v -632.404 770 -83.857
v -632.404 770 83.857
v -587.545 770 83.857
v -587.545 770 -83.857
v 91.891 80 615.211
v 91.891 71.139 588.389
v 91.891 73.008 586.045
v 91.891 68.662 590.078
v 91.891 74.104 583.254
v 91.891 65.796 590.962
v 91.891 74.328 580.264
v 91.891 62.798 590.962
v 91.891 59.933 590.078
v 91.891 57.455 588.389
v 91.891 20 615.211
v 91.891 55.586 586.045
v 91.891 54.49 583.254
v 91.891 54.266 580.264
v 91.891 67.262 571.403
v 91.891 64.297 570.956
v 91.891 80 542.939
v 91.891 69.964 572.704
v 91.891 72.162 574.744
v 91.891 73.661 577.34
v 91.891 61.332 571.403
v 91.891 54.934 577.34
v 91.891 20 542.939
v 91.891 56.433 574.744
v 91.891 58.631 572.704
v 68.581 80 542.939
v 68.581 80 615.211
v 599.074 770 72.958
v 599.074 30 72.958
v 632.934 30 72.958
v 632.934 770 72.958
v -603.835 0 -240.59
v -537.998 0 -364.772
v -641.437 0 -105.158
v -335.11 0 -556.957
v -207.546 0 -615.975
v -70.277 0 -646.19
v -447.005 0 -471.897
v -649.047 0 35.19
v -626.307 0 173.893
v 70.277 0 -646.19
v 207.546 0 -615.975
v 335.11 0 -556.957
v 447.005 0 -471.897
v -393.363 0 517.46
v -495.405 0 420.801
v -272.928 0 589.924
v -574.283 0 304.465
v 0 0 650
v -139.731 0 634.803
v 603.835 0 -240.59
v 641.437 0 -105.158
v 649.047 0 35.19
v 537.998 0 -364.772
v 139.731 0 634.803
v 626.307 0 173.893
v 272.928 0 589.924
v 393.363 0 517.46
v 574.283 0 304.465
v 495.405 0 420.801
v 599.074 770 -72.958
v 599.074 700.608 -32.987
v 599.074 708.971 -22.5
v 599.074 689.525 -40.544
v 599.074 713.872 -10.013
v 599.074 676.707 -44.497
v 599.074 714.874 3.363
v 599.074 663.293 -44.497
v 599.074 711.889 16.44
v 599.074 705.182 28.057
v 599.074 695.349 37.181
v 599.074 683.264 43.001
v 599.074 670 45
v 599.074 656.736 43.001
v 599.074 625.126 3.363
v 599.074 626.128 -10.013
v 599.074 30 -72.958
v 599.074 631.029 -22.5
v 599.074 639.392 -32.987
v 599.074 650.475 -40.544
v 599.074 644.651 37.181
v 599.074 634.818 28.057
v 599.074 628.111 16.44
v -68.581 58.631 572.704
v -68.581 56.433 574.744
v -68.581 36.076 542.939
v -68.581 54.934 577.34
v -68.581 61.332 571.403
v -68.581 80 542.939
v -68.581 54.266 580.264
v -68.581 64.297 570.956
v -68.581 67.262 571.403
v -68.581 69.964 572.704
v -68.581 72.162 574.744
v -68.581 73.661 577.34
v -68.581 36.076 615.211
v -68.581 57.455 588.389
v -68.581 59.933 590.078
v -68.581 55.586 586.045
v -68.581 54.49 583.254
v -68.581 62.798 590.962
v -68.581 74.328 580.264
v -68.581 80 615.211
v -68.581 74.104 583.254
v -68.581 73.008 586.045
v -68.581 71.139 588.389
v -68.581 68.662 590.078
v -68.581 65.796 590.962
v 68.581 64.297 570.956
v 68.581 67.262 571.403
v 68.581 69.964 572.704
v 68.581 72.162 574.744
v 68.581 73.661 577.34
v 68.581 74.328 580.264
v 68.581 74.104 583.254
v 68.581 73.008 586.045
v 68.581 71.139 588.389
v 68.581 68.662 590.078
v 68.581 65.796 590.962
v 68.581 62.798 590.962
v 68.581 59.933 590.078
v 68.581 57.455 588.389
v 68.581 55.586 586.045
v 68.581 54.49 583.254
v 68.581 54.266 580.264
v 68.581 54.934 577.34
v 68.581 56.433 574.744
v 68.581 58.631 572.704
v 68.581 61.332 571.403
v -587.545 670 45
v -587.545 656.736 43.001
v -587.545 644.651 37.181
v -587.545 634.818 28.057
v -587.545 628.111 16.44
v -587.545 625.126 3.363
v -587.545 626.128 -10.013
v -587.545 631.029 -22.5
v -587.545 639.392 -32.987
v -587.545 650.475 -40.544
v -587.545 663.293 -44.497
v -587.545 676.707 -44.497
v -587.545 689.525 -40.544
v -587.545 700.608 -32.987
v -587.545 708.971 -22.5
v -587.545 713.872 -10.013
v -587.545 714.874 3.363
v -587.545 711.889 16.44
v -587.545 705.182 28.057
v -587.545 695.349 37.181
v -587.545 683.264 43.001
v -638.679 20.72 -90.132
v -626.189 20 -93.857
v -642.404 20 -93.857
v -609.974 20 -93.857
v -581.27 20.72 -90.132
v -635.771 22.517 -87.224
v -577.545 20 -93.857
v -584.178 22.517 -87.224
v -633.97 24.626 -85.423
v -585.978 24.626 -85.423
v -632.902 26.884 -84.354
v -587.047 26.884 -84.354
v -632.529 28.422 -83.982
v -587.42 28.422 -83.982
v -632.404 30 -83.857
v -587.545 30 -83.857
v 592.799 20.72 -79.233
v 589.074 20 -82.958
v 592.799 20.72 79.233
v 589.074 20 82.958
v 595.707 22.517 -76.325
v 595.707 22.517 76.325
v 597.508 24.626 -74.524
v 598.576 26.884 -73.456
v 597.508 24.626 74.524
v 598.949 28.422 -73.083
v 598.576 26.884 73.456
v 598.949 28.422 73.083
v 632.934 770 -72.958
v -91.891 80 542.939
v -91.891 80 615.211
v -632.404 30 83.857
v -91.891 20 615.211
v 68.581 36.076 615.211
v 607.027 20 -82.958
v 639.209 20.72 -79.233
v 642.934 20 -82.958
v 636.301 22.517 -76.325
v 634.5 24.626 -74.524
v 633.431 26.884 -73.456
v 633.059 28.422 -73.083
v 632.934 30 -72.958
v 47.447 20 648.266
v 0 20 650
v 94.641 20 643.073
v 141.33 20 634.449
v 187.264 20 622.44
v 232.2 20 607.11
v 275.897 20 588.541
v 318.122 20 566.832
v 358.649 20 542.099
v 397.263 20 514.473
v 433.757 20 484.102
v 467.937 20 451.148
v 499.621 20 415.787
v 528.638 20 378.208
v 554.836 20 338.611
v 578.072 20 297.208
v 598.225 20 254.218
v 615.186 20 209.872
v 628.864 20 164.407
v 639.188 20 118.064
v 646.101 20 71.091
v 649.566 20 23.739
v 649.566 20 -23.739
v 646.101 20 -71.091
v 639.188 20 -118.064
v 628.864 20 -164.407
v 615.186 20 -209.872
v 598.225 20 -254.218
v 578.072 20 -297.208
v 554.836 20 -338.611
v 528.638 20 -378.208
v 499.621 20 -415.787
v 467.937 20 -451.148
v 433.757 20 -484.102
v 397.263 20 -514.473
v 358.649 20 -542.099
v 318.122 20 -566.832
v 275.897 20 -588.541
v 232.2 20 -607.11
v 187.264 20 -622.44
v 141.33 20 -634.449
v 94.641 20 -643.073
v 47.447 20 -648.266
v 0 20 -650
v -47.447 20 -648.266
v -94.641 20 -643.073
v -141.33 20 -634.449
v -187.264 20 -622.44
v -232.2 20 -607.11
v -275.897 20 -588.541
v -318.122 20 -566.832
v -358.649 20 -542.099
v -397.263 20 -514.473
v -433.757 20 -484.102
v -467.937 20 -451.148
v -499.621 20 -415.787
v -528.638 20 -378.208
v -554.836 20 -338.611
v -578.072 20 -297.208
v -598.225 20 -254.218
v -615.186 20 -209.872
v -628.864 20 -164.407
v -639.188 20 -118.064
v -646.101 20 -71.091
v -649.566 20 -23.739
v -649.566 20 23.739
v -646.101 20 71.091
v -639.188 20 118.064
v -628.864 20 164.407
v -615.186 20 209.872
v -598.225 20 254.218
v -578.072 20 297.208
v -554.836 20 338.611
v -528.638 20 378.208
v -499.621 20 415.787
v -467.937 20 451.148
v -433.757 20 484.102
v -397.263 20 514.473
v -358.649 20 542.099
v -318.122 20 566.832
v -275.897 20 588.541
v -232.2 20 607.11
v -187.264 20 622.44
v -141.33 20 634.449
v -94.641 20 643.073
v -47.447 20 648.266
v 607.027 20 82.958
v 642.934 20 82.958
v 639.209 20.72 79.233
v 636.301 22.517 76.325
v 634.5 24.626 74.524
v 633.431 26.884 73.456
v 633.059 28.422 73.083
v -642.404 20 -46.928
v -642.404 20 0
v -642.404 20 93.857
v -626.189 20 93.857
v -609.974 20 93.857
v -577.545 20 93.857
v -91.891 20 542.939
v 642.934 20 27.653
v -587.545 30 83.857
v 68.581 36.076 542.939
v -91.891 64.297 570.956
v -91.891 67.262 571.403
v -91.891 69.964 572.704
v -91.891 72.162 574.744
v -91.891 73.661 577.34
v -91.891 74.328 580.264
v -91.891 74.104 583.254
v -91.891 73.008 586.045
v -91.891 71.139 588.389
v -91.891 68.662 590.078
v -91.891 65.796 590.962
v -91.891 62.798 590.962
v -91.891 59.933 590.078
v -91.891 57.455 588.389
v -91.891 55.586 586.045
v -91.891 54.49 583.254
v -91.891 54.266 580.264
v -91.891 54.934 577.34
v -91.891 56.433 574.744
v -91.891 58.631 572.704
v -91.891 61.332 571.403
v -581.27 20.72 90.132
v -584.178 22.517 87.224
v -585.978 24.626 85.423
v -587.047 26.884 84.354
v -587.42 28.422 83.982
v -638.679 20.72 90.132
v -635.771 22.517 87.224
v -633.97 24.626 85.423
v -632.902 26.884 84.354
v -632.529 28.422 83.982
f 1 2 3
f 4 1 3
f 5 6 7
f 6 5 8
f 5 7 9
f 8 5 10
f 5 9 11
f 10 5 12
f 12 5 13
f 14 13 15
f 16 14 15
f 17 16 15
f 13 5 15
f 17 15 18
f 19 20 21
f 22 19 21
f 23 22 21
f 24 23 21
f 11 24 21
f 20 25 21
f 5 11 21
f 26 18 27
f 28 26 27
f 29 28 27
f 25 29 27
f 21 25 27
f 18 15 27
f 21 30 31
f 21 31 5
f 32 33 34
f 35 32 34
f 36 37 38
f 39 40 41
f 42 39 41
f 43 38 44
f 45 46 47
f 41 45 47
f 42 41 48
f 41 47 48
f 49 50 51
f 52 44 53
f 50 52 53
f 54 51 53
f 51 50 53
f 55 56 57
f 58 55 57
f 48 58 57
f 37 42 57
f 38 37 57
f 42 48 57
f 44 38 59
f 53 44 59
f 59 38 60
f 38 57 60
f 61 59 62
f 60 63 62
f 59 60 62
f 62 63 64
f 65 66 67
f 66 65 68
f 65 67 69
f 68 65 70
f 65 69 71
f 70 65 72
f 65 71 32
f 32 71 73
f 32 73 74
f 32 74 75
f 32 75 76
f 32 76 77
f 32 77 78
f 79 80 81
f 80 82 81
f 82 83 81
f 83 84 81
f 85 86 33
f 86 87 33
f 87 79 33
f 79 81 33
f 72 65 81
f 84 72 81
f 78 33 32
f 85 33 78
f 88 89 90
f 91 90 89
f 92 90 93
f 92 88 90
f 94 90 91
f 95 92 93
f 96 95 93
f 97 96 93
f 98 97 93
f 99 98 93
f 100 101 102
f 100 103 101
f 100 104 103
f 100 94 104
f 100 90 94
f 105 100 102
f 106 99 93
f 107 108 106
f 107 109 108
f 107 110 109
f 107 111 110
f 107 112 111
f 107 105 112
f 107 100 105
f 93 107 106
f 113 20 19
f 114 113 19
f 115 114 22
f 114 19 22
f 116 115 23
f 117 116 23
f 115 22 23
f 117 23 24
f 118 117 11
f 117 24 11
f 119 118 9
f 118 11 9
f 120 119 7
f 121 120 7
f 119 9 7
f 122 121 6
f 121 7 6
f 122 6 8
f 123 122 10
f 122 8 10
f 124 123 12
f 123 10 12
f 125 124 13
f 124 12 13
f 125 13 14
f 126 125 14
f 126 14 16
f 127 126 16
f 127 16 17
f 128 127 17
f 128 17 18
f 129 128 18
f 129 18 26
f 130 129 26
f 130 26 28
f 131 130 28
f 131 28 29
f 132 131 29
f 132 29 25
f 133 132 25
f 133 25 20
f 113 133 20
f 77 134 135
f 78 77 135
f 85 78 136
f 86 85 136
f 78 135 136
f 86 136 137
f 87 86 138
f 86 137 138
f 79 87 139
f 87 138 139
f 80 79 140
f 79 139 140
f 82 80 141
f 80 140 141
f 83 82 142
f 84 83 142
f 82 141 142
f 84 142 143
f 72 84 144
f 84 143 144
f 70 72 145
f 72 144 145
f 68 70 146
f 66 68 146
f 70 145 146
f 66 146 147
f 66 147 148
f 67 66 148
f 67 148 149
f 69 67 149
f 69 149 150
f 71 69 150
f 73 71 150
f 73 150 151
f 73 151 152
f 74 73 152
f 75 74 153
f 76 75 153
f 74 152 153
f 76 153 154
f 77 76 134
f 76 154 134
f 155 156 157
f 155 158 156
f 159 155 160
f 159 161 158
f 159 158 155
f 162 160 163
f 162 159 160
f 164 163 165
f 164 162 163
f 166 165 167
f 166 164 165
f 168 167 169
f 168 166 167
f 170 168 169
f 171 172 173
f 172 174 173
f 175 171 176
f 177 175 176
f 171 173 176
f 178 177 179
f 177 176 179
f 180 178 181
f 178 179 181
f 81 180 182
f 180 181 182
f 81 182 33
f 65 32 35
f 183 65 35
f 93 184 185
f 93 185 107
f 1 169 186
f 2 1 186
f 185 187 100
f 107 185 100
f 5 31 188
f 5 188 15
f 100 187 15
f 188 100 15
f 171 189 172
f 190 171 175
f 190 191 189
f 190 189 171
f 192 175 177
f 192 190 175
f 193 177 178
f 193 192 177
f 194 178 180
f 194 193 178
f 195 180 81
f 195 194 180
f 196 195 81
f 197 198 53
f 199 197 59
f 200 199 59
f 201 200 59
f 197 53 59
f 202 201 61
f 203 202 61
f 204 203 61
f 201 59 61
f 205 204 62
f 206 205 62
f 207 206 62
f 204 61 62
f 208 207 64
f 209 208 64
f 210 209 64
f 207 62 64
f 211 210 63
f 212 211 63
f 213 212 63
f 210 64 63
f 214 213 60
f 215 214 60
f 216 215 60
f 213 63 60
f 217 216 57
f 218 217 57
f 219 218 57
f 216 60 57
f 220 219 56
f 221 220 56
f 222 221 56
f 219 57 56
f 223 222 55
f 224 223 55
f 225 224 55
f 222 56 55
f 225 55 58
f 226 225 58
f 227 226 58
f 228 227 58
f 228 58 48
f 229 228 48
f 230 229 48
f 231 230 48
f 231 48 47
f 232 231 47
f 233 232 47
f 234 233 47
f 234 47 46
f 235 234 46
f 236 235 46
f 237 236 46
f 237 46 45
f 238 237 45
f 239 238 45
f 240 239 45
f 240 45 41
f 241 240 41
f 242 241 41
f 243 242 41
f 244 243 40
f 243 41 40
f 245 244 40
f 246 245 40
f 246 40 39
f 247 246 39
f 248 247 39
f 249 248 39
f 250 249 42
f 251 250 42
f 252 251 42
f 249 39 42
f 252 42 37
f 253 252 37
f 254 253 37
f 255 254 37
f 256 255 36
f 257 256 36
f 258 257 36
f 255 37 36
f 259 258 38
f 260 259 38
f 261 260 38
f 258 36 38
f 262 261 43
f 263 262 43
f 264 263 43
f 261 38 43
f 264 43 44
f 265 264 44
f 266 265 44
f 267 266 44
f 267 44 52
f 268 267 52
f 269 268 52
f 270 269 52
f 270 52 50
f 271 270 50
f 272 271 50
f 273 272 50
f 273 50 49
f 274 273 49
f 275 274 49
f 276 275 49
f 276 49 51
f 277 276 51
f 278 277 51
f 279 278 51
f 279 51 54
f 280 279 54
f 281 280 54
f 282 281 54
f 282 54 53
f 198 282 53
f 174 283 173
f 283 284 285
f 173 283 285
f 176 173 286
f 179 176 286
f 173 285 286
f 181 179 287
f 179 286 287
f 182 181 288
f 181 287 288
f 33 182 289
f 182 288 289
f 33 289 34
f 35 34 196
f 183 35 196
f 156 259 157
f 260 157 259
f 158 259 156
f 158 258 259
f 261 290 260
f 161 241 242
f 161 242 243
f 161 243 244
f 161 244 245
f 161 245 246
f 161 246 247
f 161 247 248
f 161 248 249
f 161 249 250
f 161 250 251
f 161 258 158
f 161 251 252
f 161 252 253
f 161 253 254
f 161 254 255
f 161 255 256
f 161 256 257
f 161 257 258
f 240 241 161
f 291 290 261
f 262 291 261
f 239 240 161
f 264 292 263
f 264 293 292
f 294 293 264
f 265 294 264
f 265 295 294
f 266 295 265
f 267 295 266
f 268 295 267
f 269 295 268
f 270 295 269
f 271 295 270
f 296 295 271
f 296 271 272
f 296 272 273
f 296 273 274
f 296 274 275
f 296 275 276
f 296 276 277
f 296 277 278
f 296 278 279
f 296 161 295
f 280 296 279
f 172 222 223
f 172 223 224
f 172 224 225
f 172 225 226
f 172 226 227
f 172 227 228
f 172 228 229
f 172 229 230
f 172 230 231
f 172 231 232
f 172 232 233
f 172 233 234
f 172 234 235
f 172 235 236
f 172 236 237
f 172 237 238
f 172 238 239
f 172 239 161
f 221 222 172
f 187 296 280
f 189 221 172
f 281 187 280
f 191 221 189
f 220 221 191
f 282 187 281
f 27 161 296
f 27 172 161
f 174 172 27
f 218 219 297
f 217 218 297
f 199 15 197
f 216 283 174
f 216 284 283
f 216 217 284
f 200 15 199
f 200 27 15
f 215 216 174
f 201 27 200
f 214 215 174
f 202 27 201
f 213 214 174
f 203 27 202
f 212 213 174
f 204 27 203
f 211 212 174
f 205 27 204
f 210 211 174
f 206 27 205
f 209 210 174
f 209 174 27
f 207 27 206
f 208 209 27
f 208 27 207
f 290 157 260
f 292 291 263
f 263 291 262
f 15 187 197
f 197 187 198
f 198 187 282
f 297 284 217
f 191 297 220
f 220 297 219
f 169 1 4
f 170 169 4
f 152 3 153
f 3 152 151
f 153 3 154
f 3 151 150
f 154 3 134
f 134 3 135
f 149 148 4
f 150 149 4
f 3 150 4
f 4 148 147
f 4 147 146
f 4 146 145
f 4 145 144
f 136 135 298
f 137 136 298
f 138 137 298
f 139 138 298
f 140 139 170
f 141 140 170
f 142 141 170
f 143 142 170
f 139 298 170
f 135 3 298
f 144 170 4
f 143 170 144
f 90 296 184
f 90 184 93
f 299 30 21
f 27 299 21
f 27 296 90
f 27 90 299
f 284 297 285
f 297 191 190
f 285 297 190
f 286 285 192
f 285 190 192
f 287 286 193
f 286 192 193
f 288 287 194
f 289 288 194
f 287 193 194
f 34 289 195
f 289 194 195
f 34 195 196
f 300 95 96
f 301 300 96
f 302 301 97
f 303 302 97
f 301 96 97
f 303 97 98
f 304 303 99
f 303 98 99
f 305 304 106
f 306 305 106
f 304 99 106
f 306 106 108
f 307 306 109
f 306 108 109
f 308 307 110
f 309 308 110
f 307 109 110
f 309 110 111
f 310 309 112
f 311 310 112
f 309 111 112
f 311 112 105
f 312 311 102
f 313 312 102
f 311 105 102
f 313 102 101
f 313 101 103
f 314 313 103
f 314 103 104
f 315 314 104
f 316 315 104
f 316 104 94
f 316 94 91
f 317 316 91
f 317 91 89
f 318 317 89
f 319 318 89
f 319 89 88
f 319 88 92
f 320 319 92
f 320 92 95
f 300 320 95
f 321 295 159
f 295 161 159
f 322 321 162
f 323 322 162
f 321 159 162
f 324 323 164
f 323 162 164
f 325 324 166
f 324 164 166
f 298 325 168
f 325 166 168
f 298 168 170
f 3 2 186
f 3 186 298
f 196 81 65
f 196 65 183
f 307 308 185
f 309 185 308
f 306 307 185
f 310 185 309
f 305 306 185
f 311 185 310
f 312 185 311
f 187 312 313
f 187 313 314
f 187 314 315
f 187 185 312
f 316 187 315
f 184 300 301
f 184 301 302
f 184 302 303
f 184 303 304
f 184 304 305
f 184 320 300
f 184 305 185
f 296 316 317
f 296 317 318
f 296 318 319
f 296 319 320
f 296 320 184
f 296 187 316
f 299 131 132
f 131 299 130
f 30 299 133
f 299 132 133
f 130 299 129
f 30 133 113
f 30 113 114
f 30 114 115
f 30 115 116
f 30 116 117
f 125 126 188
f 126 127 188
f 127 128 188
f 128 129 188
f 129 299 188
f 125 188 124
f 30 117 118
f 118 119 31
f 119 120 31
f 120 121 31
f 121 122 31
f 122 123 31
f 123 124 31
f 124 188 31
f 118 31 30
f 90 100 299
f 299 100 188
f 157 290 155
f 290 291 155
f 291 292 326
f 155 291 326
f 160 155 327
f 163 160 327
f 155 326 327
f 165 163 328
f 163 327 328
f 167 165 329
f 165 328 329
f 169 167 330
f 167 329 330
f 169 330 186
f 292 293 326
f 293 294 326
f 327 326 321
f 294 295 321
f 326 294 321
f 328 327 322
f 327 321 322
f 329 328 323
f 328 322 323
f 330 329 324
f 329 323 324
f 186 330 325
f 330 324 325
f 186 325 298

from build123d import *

# Parameters (mm, degrees)
SKETCH1_R           = 650
BOSS_EXTRUDE1_DEPTH = 20
SKETCH2_W           = 33.859391453
SKETCH2_H           = 72.958055336
SKETCH2_W_2         = 44.858886192
SKETCH2_H_2         = 83.856653026
BOSS_EXTRUDE2_DEPTH = 750
SKETCH3_R           = 45
BOSS_EXTRUDE3_DEPTH = 1186.61916287
FILLET1_R           = 10
SKETCH4_W           = 183.78137906
SKETCH4_H           = 72.271116226
BOSS_EXTRUDE4_DEPTH = 60
SKETCH5_W           = 137.162690518
SKETCH5_H           = 87.847771894
CUT_EXTRUDE1_DEPTH  = 139
SKETCH6_R           = 10.058928829
CUT_EXTRUDE2_DEPTH  = 200


with BuildPart() as part:
    # Sketch1 → Boss-Extrude1 (new body)
    with BuildSketch(Plane(origin=(0, 0, 0), x_dir=(1, 0, 0), z_dir=(0, 1, 0))):
        with Locations(Location((0, 0, 0), (0, 0, 270))):
            Circle(SKETCH1_R)
    extrude(amount=BOSS_EXTRUDE1_DEPTH)

    # Sketch2 → Boss-Extrude2 (add)
    with BuildSketch(Plane(origin=(0, 20, 0), x_dir=(1, 0, 0), z_dir=(0, 1, 0))):
        with Locations((616.00396434, -36.479027668)):
            Rectangle(SKETCH2_W, SKETCH2_H)
        with Locations((616.00396434, 36.479027668)):
            Rectangle(SKETCH2_W, SKETCH2_H)
        with Locations((-609.974337352, -41.928326513)):
            Rectangle(SKETCH2_W_2, SKETCH2_H_2)
        with Locations((-609.974337352, 41.928326513)):
            Rectangle(SKETCH2_W_2, SKETCH2_H_2)
    extrude(amount=BOSS_EXTRUDE2_DEPTH)

    # Sketch3 → Boss-Extrude3 (add)
    with BuildSketch(Plane(origin=(-587.544894256, 0, 0), x_dir=(0, 0, -1), z_dir=(1, 0, 0))):
        with Locations(Location((0, 670, 0), (0, 0, 180))):
            Circle(SKETCH3_R)
    extrude(amount=BOSS_EXTRUDE3_DEPTH)

    # Fillet1
    fillet1_edges = [part.edges().sort_by_distance(p)[0] for p in [
        (616.00396434, 20, -72.958055336),
        (-609.974337352, 20, 83.856653026),
        (-587.544894256, 20, 0),
        (-632.403780448, 20, 0),
        (-609.974337352, 20, -83.856653026),
        (616.00396434, 20, 72.958055336),
        (632.933660066, 20, 0),
        (599.074268613, 20, 0),
    ]]
    fillet(fillet1_edges, radius=FILLET1_R)

    # Sketch4 → Boss-Extrude4 (add)
    with BuildSketch(Plane(origin=(0, 20, 0), x_dir=(1, 0, 0), z_dir=(0, 1, 0))):
        with Locations((0, -579.075005183)):
            Rectangle(SKETCH4_W, SKETCH4_H)
    extrude(amount=BOSS_EXTRUDE4_DEPTH)

    # Sketch5 → Cut-Extrude1 (cut)
    with BuildSketch(Plane.XY.offset(615.210563296)):
        with Locations((0, 80)):
            Rectangle(SKETCH5_W, SKETCH5_H)
    extrude(amount=-CUT_EXTRUDE1_DEPTH, mode=Mode.SUBTRACT)

    # Sketch6 → Cut-Extrude2 (cut)
    with BuildSketch(Plane(origin=(91.89068953, 0, 0), x_dir=(0, 0, -1), z_dir=(1, 0, 0))):
        with Locations((-581.015384382, 64.297210262)):
            Circle(SKETCH6_R)
    extrude(amount=-CUT_EXTRUDE2_DEPTH, mode=Mode.SUBTRACT)


solid = part.part
